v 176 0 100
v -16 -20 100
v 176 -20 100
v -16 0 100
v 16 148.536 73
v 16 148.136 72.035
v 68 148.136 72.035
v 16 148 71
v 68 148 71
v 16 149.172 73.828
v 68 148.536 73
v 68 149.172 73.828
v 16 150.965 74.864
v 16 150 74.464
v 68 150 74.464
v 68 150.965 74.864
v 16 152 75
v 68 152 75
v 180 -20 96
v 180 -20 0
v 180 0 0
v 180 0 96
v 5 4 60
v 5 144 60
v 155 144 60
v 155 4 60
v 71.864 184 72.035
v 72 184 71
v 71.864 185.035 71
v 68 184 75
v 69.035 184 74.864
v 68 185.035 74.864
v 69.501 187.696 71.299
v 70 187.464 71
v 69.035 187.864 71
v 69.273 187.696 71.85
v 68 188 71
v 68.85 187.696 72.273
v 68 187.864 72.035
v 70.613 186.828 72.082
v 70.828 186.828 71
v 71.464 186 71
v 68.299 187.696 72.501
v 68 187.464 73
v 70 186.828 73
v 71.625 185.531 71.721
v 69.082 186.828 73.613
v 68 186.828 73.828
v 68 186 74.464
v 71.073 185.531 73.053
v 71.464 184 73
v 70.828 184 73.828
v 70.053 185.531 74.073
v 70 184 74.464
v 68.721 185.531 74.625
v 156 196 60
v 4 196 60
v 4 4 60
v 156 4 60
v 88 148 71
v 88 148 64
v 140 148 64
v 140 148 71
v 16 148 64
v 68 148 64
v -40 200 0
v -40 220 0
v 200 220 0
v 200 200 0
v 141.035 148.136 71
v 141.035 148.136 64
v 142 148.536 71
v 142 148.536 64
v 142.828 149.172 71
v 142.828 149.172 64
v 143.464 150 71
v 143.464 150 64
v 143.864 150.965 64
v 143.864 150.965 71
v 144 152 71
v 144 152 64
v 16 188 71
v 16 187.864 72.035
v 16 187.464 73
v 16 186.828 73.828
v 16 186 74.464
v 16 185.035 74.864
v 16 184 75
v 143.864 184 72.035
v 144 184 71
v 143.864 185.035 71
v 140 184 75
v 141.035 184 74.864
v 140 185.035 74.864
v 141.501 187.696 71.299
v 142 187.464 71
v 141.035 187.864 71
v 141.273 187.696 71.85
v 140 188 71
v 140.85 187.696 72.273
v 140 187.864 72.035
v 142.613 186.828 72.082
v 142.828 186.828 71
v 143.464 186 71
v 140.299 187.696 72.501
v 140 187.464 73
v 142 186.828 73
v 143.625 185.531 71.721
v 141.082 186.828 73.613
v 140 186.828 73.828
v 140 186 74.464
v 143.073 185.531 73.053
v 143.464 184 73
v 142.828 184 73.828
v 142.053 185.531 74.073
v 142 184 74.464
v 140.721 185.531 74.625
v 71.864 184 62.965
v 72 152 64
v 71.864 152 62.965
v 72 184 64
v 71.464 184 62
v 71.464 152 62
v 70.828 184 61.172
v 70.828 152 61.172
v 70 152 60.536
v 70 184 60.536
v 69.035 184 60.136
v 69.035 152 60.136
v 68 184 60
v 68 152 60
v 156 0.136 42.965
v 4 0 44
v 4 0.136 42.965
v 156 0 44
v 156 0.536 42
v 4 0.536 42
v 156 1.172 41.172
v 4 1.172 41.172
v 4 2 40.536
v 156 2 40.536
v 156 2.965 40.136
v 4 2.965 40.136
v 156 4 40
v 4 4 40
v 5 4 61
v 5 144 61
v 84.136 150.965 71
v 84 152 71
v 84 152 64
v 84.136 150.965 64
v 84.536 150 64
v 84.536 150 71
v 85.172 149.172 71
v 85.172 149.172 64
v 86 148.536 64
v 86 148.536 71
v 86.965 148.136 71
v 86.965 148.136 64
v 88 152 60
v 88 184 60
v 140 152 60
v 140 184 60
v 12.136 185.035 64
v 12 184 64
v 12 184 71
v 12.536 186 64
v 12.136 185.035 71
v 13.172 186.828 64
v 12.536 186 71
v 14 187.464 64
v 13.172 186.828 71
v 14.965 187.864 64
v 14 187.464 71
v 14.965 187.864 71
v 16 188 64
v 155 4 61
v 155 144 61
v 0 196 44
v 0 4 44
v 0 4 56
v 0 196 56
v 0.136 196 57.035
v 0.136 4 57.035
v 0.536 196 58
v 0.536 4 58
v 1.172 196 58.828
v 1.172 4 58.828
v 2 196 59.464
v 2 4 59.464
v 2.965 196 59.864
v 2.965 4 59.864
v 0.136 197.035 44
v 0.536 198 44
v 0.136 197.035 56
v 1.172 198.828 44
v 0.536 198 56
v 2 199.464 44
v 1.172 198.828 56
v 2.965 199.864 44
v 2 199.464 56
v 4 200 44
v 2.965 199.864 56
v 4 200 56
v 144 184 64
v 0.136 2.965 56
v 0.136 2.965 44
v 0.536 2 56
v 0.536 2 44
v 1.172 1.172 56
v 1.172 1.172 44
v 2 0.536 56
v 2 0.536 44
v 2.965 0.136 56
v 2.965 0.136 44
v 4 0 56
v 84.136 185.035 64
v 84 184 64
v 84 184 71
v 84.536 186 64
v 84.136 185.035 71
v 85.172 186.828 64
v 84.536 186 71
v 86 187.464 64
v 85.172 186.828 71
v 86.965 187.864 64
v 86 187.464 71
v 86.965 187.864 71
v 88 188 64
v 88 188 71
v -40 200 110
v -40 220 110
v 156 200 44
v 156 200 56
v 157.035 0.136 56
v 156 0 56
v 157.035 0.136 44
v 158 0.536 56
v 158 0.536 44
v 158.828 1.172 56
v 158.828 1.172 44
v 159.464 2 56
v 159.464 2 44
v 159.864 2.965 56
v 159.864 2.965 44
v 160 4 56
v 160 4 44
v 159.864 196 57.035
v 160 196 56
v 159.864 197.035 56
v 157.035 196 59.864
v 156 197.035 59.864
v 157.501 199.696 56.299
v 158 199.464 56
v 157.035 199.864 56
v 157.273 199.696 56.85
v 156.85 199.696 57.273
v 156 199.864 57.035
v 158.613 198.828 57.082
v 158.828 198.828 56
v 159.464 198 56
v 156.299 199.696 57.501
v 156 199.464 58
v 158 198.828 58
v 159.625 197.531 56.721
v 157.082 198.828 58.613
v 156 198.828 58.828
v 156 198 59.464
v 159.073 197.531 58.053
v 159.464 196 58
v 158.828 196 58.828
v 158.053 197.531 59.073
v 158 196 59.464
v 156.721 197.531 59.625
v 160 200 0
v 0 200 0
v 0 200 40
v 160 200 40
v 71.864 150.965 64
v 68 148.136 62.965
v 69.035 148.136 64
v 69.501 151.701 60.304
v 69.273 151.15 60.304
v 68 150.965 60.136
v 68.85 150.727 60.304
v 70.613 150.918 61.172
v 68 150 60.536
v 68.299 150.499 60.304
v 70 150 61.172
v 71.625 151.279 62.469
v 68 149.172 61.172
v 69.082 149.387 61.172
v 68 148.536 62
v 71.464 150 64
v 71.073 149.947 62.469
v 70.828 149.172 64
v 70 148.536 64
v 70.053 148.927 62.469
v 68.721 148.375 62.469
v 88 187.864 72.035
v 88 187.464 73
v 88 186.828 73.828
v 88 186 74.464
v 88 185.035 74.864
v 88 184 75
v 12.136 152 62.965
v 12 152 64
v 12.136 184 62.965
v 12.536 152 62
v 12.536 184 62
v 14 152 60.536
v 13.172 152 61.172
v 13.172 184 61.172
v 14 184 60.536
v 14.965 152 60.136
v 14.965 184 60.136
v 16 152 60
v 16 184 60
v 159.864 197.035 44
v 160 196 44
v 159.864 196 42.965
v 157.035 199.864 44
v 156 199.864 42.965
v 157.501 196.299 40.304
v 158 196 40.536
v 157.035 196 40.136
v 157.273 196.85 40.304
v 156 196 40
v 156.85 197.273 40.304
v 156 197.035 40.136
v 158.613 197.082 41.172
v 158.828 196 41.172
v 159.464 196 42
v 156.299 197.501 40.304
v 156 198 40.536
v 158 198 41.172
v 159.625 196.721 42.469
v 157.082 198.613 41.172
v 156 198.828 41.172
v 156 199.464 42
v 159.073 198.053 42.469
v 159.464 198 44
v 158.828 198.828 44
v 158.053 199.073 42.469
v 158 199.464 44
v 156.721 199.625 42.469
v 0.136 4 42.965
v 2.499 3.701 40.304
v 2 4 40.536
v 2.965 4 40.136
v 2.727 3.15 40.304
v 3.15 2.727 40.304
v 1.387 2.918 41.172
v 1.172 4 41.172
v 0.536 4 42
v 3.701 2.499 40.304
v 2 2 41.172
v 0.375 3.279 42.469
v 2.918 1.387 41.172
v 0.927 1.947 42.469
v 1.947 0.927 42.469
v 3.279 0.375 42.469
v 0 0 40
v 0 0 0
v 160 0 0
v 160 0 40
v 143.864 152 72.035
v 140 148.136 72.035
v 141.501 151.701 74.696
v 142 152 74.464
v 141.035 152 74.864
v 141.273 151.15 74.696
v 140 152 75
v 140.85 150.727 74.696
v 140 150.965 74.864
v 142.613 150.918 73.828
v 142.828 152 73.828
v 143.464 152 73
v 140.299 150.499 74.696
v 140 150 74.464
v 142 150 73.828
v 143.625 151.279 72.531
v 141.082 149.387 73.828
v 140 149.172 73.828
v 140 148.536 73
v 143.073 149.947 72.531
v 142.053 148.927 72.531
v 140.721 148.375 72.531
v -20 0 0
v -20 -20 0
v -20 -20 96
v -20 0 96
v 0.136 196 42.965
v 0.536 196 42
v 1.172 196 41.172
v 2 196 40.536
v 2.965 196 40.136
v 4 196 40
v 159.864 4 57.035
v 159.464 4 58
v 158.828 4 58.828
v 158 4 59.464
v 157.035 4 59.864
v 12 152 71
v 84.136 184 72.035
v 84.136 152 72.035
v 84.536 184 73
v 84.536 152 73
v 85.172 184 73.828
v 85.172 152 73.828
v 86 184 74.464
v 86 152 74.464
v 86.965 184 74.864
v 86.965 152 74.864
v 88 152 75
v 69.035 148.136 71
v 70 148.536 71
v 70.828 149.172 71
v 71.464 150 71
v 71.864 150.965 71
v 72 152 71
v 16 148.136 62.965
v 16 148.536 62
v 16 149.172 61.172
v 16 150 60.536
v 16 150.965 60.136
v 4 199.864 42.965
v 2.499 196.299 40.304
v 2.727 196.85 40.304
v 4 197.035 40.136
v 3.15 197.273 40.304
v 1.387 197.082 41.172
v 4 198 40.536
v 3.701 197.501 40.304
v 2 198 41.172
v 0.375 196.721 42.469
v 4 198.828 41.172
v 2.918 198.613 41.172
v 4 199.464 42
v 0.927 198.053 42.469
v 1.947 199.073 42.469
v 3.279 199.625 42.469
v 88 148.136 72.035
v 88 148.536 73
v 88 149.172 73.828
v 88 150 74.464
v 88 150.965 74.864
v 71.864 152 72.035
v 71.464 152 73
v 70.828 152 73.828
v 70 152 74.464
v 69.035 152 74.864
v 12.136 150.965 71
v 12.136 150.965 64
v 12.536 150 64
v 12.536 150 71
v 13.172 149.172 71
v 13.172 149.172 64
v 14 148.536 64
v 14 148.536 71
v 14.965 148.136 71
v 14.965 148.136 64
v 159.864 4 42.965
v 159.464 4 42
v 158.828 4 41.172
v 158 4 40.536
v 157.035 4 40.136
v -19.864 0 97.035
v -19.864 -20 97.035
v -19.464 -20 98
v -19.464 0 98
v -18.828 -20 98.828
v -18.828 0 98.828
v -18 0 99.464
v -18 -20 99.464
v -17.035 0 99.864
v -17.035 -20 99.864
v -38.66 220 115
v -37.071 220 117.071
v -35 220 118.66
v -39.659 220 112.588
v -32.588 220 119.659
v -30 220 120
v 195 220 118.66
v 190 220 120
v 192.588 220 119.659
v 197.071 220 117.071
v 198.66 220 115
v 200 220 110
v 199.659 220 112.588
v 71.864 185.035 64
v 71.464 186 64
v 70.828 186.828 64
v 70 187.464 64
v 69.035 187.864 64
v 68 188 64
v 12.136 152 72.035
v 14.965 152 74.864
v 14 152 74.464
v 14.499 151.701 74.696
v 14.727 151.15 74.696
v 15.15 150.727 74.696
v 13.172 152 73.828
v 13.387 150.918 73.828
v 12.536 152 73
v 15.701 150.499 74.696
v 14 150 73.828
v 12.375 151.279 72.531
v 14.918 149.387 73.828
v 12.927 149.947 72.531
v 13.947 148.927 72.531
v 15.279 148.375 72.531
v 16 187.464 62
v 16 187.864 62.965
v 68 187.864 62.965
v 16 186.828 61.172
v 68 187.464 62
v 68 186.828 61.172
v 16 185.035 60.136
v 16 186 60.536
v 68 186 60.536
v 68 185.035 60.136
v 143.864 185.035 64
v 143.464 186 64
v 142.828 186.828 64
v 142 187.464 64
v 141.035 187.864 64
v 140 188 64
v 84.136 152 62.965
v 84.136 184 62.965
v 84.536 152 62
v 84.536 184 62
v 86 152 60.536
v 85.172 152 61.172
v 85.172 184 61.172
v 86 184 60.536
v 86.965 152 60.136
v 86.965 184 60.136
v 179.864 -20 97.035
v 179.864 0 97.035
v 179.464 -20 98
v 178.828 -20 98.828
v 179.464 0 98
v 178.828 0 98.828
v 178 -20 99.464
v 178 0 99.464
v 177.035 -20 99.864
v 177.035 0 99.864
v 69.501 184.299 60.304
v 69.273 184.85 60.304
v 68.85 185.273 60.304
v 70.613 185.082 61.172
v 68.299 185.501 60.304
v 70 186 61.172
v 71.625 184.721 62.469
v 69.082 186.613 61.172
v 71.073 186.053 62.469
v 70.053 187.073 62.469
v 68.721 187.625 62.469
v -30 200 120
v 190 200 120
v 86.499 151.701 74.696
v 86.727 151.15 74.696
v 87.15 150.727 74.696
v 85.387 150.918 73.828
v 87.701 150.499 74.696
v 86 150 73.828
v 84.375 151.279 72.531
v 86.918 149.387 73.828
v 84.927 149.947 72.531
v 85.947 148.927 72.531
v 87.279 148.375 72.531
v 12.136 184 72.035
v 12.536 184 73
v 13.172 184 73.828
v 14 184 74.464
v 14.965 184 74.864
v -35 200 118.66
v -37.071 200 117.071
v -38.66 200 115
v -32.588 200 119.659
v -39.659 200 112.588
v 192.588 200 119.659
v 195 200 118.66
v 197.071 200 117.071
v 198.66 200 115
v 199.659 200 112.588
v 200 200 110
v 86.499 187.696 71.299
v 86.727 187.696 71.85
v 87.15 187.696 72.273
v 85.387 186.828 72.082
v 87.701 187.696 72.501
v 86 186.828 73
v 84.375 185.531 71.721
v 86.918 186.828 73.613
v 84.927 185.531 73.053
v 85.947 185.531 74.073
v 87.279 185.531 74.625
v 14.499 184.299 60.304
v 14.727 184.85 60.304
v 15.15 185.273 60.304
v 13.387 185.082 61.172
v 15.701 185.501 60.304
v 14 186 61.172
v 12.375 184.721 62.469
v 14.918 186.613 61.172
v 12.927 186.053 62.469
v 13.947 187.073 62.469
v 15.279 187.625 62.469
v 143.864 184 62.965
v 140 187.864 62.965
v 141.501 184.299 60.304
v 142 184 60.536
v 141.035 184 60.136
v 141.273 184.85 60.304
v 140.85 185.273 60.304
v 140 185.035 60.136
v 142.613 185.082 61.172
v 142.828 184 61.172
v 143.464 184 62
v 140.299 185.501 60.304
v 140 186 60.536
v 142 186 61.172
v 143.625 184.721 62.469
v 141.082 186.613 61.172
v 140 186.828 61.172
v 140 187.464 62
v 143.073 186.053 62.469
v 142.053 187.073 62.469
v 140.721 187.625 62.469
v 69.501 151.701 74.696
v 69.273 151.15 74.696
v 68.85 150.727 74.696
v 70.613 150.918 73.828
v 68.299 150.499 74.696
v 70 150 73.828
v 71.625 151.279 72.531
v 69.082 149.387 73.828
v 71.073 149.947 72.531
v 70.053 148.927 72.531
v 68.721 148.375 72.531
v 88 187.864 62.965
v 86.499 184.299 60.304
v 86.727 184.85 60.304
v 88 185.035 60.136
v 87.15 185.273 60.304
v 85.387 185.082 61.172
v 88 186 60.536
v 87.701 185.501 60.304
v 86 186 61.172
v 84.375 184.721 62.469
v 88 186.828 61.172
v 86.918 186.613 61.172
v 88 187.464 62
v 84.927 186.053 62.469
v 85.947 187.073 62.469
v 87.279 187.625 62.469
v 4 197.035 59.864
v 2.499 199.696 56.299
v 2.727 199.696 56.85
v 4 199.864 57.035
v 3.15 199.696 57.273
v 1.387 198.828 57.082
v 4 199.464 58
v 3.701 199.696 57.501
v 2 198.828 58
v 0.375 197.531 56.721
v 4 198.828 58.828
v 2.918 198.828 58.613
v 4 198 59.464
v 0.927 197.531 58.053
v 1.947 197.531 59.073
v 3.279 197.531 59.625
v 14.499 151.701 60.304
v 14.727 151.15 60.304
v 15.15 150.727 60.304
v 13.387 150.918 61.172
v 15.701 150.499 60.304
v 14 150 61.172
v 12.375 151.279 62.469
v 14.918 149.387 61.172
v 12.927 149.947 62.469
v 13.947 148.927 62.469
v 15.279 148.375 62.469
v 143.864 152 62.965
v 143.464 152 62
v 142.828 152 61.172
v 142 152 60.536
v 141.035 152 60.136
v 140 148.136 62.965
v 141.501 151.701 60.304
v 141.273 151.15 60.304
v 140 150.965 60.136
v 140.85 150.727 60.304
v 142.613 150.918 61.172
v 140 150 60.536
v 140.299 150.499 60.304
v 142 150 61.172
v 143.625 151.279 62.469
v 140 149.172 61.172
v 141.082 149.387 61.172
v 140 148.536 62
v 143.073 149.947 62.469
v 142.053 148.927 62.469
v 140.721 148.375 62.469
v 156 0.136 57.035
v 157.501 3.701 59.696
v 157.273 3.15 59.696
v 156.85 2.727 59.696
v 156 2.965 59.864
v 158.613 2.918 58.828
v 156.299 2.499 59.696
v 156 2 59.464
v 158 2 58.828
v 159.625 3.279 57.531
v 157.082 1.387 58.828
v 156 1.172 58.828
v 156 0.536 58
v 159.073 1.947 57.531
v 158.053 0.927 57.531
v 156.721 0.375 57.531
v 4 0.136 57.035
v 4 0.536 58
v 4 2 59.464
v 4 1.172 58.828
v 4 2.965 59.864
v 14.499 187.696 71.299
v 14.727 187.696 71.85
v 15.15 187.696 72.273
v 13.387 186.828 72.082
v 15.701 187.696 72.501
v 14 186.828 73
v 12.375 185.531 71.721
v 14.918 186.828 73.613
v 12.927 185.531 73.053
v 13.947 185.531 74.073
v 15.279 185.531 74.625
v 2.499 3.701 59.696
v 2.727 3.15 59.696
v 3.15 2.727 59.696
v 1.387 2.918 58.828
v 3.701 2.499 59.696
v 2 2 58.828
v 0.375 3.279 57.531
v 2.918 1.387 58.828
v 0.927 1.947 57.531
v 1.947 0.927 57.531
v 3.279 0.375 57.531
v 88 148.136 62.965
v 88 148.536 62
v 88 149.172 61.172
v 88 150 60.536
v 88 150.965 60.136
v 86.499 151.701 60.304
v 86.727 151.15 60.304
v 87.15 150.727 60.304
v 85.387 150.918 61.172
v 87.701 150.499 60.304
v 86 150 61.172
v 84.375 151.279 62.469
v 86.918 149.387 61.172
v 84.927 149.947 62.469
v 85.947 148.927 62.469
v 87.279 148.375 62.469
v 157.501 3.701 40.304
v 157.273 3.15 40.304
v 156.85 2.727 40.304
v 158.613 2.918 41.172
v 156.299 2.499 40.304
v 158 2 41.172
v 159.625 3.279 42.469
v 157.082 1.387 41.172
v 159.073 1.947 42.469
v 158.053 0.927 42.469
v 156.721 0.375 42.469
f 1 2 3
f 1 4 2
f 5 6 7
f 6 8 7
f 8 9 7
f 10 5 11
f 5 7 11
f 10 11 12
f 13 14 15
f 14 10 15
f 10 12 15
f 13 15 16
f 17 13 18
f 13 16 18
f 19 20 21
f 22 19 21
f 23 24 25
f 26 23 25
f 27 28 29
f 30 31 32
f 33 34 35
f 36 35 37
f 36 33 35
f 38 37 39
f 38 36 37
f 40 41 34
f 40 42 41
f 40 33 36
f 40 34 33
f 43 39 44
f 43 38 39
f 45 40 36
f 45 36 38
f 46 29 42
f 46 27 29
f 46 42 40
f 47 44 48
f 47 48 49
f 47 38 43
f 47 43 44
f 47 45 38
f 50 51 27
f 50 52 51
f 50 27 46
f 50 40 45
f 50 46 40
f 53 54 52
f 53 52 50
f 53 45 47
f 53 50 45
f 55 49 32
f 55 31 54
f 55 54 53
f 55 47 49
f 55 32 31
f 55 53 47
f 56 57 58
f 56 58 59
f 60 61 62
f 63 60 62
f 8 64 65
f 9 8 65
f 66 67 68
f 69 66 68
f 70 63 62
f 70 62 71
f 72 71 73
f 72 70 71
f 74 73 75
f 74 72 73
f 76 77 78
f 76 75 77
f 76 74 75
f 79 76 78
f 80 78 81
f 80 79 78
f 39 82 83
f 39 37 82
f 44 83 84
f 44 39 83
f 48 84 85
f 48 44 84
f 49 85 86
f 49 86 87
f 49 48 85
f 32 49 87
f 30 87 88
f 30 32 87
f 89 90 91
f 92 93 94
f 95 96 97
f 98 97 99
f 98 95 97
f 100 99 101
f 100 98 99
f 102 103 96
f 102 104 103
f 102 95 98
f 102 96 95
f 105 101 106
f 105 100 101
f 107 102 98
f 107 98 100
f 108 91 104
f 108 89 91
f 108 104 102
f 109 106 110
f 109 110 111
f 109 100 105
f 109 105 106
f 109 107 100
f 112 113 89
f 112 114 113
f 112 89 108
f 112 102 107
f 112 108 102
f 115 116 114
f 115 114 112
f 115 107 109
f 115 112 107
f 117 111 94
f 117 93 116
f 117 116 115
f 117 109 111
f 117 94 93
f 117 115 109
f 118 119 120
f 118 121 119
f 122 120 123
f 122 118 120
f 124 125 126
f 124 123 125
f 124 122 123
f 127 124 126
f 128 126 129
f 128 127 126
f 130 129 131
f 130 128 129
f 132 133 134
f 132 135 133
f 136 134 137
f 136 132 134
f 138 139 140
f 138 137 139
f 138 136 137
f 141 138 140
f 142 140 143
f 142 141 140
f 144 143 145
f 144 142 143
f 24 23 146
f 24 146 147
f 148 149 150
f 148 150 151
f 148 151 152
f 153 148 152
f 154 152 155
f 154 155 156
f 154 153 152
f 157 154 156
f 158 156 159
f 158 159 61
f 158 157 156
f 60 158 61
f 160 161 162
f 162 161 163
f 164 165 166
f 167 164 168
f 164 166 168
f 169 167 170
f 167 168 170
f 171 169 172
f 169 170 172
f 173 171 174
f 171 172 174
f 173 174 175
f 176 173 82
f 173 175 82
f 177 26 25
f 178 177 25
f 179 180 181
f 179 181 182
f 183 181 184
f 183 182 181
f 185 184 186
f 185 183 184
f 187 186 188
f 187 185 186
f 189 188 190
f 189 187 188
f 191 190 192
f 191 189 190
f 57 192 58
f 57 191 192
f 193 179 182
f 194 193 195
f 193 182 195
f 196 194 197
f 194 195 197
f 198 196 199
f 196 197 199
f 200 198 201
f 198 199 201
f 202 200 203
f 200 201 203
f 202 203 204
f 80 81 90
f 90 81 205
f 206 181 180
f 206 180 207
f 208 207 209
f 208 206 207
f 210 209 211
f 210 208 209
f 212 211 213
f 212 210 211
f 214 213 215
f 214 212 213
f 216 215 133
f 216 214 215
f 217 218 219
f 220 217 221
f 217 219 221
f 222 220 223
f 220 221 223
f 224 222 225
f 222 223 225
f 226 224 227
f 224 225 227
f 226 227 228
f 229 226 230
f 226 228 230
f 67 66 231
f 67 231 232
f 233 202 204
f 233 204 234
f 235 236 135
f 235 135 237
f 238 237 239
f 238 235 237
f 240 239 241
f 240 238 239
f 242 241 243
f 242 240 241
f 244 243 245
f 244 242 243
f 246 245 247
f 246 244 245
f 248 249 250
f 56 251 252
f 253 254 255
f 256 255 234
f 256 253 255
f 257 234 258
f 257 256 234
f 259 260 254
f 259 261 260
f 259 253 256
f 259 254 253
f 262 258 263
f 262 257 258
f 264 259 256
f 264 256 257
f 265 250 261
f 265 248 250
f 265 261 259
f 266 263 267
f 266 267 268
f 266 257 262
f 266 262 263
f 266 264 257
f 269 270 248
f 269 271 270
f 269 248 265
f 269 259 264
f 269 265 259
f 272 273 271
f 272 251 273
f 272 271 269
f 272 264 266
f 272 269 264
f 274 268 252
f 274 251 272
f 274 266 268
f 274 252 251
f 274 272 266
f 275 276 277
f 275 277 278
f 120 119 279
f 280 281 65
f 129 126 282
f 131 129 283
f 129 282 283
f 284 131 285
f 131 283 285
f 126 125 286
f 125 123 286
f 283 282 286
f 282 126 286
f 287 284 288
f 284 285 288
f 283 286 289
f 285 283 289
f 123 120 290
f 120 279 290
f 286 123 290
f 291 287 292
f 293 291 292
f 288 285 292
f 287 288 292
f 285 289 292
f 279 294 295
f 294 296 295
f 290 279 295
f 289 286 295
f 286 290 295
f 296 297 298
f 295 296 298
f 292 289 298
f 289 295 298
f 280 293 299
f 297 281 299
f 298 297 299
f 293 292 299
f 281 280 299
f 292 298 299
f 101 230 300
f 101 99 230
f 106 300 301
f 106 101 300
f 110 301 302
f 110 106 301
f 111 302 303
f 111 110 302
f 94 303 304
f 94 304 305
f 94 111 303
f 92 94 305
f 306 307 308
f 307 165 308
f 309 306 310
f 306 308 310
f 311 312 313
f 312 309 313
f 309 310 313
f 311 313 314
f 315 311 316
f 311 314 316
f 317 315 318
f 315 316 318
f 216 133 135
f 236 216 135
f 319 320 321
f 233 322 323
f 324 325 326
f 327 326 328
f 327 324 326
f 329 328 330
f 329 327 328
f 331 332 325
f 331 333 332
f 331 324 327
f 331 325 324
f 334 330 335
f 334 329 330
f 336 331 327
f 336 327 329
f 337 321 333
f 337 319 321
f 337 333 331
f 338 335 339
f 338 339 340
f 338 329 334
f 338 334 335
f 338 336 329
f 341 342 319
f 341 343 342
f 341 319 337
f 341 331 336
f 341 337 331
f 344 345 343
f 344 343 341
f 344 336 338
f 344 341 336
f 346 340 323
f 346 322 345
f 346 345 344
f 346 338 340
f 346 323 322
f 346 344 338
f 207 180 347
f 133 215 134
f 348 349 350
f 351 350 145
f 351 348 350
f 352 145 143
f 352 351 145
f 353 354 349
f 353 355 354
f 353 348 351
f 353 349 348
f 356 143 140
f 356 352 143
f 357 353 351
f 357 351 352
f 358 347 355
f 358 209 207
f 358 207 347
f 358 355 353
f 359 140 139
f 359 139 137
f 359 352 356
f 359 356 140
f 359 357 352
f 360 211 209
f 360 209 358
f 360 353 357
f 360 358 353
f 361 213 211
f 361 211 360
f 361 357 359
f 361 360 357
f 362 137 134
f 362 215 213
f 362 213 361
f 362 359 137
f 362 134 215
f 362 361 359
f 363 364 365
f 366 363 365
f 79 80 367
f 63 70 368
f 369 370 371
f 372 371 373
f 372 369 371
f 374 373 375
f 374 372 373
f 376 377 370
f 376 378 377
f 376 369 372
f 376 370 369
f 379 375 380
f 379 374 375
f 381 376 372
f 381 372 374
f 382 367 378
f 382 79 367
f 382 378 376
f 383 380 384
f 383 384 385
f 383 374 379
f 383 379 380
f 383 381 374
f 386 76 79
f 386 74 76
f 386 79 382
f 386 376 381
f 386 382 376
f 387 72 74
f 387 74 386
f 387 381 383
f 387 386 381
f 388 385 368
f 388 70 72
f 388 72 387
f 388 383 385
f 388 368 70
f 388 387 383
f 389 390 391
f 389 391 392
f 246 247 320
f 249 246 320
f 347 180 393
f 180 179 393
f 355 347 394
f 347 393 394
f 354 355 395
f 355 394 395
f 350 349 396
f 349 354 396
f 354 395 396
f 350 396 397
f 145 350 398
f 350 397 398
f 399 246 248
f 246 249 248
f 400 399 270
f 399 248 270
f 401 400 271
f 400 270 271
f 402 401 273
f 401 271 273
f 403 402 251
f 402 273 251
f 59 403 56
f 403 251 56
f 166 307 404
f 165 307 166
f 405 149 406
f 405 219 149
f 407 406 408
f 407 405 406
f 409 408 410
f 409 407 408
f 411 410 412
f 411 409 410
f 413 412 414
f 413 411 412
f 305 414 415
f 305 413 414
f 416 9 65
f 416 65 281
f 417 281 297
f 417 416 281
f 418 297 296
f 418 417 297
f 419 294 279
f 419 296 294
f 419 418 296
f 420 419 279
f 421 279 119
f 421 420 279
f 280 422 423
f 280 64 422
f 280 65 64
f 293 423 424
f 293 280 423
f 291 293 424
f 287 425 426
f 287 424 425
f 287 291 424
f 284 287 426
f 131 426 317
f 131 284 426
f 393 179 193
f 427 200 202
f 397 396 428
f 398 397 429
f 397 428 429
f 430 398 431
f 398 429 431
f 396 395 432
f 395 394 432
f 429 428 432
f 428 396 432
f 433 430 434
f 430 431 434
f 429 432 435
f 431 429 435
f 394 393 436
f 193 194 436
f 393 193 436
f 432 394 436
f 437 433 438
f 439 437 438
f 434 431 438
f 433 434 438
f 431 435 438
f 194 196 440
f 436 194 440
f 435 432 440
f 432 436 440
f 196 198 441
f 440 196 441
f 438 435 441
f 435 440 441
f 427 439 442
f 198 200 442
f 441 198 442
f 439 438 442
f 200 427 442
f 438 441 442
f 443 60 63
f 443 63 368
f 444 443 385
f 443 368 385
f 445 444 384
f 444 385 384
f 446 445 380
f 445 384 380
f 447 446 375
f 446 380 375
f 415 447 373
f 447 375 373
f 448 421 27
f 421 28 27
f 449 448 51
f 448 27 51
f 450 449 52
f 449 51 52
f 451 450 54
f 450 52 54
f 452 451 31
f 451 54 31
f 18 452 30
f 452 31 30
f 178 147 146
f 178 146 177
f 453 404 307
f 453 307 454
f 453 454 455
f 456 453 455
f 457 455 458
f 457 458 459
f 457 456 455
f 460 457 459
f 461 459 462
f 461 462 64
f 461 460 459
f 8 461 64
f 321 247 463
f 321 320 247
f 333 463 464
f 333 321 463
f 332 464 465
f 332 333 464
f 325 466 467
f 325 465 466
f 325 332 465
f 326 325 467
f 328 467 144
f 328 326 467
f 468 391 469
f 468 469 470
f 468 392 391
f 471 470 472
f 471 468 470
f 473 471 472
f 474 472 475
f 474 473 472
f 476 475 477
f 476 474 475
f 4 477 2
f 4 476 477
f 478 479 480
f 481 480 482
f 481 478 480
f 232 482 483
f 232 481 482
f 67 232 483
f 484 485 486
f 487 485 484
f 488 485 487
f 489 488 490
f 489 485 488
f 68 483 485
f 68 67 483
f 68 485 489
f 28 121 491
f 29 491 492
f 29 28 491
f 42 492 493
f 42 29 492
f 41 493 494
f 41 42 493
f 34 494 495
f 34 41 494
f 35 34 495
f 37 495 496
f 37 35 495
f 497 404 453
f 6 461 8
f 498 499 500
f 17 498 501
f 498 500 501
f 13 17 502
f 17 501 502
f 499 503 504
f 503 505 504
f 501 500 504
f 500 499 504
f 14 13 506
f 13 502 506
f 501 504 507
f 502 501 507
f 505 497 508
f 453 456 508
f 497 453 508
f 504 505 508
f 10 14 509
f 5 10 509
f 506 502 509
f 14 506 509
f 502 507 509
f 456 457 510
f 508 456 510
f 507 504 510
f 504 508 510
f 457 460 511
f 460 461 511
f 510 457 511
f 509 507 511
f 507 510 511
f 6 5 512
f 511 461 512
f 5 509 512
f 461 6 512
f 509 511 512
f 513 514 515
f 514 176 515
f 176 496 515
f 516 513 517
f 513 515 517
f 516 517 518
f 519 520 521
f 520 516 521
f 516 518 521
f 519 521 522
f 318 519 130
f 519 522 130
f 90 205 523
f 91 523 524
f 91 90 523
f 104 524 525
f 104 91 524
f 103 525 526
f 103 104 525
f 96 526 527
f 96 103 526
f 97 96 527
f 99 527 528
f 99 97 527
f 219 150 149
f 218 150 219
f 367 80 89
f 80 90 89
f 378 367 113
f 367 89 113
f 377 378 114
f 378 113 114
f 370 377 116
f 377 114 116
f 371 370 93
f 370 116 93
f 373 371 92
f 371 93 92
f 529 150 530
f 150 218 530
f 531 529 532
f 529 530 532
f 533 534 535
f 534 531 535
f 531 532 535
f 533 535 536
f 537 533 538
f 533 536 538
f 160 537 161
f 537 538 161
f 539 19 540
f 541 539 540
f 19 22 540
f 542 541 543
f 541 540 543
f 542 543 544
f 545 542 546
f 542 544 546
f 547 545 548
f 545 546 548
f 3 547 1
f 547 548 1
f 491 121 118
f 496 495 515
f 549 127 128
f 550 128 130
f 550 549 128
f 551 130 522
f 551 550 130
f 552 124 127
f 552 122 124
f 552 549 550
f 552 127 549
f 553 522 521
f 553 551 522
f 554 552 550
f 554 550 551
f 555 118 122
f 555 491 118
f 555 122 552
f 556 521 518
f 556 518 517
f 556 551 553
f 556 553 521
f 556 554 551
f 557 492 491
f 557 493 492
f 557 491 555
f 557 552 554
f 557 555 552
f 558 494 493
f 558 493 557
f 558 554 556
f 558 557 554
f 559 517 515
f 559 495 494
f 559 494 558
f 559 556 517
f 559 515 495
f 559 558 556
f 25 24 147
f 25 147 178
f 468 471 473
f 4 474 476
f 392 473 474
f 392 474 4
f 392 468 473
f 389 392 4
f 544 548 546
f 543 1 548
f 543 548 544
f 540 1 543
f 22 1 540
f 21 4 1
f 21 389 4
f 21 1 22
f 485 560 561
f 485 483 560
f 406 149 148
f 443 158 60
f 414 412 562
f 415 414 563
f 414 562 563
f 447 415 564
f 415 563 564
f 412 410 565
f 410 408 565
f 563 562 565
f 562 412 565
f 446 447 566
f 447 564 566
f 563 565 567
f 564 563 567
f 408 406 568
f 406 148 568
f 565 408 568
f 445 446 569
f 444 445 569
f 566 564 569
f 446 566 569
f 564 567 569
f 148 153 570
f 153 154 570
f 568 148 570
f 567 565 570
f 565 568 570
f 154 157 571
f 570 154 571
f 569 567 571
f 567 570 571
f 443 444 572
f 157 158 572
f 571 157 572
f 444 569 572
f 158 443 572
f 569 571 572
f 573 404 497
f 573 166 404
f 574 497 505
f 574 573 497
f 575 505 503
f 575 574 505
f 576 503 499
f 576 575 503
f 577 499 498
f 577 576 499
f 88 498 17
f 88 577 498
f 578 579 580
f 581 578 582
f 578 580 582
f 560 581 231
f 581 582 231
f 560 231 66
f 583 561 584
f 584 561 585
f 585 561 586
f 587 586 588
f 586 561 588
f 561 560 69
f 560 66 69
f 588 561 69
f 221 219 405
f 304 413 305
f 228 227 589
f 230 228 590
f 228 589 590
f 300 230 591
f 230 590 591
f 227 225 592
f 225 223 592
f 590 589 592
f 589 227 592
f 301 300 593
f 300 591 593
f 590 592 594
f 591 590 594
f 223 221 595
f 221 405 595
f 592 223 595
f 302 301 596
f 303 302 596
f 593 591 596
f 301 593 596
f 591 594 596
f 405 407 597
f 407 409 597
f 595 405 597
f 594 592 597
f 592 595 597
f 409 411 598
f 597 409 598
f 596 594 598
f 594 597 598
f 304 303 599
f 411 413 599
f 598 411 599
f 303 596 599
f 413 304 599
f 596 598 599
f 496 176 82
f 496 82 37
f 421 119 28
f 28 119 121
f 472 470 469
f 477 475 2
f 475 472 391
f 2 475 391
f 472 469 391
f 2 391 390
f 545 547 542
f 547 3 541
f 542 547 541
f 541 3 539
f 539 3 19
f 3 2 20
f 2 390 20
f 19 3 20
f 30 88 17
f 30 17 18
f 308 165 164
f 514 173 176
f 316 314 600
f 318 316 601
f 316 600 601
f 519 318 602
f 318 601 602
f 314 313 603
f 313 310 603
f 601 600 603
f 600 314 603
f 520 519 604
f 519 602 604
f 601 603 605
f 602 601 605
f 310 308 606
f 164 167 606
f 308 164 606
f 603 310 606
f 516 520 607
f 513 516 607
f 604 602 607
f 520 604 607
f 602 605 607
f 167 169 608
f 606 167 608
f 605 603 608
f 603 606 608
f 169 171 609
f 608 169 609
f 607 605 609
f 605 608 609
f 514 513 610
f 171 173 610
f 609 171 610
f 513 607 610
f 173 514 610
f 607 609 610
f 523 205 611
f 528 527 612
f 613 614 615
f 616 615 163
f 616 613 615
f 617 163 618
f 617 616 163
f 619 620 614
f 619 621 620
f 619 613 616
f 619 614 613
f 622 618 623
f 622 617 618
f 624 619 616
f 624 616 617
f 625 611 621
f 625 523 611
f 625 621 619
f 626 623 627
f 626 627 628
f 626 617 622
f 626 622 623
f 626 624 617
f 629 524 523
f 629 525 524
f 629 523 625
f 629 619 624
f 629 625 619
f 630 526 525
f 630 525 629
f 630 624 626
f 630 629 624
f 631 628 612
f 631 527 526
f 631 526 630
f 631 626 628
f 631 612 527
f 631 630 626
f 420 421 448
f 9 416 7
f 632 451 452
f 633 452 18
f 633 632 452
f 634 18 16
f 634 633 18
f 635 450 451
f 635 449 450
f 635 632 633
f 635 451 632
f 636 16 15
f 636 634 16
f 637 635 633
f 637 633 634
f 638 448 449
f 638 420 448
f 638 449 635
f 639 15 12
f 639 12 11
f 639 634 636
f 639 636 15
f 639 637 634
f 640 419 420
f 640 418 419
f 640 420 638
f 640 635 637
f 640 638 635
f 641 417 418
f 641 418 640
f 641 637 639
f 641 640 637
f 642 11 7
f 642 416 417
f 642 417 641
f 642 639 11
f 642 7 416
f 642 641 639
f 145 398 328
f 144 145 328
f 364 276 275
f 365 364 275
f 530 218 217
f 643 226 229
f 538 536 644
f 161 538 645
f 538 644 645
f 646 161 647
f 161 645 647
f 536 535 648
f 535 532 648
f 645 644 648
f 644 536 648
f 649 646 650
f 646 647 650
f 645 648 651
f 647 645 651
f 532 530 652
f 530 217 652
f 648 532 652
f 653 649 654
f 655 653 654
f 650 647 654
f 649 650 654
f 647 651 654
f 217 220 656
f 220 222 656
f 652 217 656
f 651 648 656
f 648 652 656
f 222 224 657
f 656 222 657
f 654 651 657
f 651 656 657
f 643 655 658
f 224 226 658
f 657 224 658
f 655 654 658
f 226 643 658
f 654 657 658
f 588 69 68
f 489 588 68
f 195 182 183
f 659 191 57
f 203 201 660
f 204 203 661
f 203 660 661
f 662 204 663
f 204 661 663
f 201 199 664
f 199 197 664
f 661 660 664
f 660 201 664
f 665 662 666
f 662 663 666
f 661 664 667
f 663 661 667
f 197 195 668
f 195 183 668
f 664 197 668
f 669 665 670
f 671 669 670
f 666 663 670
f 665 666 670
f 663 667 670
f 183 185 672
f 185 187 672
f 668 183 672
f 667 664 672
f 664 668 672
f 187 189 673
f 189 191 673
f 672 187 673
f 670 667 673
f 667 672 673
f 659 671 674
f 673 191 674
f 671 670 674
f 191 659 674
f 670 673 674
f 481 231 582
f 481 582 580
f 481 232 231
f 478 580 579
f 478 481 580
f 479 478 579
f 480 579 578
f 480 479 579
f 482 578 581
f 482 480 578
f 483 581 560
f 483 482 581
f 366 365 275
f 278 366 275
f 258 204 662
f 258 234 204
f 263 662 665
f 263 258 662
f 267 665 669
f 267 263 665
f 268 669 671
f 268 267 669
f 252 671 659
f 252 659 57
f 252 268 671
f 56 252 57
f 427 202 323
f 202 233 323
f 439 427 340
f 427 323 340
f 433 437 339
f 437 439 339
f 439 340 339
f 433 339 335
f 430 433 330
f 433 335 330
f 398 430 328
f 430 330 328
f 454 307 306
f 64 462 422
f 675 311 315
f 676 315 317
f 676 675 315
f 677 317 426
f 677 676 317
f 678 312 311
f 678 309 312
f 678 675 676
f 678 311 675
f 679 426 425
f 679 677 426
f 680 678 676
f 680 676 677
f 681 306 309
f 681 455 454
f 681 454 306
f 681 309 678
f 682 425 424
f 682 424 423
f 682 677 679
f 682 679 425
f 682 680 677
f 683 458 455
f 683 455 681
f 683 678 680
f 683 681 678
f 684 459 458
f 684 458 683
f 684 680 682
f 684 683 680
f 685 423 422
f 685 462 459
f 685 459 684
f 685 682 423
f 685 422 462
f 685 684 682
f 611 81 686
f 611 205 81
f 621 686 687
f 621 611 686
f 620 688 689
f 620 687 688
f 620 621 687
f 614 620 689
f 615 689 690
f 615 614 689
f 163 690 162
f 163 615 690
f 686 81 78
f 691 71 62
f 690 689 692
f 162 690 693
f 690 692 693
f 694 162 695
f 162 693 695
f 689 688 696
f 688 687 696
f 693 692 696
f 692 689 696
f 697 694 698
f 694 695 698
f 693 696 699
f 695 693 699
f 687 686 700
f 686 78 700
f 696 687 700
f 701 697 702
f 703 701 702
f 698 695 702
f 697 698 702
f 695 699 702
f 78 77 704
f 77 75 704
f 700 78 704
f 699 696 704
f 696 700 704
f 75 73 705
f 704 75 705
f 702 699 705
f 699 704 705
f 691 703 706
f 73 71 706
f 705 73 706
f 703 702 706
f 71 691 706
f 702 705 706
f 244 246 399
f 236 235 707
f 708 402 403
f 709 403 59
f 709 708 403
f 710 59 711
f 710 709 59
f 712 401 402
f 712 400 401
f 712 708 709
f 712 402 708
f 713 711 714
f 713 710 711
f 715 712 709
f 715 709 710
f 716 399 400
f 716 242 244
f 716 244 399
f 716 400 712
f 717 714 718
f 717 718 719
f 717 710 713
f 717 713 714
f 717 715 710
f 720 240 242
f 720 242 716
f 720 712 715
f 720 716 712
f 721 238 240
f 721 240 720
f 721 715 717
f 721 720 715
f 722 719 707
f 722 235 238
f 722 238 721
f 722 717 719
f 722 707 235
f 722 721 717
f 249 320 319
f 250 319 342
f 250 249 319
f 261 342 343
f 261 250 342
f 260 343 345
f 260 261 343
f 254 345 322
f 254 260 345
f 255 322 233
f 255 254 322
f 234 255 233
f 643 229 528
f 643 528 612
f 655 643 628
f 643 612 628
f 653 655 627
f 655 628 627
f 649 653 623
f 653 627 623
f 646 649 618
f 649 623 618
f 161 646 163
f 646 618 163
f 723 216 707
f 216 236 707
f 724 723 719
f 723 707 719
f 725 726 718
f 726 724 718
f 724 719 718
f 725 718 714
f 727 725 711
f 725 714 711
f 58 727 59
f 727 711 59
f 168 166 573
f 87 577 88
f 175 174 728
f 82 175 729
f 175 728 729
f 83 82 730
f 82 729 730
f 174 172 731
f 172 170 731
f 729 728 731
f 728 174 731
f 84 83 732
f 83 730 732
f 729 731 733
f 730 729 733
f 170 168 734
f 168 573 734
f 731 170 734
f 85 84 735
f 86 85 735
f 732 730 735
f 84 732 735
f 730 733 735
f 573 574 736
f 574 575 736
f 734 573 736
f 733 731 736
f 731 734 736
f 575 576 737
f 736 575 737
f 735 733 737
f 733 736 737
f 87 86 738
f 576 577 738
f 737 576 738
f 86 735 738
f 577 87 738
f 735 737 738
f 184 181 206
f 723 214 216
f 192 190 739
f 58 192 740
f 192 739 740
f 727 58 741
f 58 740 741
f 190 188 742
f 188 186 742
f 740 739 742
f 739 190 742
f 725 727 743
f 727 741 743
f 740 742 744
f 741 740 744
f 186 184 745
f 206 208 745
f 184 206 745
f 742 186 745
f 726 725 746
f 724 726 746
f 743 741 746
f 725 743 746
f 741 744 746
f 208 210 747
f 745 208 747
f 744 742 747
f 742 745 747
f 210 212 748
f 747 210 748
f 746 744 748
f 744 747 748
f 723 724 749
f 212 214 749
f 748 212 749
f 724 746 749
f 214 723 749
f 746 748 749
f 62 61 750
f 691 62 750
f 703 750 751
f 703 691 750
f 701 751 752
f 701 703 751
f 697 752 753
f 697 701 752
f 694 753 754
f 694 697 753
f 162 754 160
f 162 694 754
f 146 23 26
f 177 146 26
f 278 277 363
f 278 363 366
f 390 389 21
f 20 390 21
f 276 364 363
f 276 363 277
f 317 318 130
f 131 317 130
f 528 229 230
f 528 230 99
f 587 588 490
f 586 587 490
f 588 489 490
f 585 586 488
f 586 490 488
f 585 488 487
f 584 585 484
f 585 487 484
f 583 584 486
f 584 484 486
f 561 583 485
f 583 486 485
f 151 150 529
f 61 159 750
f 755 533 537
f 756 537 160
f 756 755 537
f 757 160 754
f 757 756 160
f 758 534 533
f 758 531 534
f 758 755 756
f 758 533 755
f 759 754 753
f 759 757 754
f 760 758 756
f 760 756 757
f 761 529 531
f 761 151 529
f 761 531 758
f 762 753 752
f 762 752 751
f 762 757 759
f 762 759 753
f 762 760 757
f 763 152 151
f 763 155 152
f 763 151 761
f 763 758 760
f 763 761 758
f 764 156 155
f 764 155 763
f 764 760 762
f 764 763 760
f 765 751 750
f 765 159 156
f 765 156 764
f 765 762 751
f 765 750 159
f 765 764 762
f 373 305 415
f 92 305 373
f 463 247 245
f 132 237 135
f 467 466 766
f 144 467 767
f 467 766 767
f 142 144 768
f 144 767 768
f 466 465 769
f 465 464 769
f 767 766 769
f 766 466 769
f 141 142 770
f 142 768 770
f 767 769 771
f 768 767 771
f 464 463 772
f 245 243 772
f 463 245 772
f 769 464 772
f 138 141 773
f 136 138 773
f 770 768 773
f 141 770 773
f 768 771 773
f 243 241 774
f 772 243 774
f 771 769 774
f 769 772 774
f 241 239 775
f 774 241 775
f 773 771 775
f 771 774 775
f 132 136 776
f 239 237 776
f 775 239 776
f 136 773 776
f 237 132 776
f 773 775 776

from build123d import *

# Parameters (mm, degrees)
BOX_W        = 160
BOX_H        = 200
BOX_DEPTH    = 40
BOX001_W     = 160
BOX001_H     = 200
BOX001_DEPTH = 20
FILLET_R     = 4
BOX002_W     = 240
BOX002_H     = 20
BOX002_DEPTH = 120
FILLET001_R  = 10
BOX003_W     = 60
BOX003_H     = 40
BOX003_DEPTH = 15
FILLET002_R  = 4
BOX004_W     = 60
BOX004_H     = 40
BOX004_DEPTH = 15
FILLET003_R  = 4
BOX005_W     = 200
BOX005_H     = 20
BOX005_DEPTH = 100
FILLET004_R  = 4
BOX006_W     = 150
BOX006_H     = 140
BOX006_DEPTH = 1


with BuildPart() as sommier:
    # Box → Box (new body)
    with BuildSketch(Plane.XY):
        with Locations((80, 100)):
            Rectangle(BOX_W, BOX_H)
    extrude(amount=BOX_DEPTH)


with BuildPart() as matelas:
    # Box001 → Box001 (new body)
    with BuildSketch(Plane.XY.offset(40)):
        with Locations((80, 100)):
            Rectangle(BOX001_W, BOX001_H)
    extrude(amount=BOX001_DEPTH)

    # Fillet
    fillet_edges = [matelas.edges().sort_by_distance(p)[0] for p in [
        (0, 0, 50),
        (0, 100, 60),
        (0, 200, 50),
        (0, 100, 40),
        (160, 0, 50),
        (160, 100, 60),
        (160, 200, 50),
        (160, 100, 40),
        (80, 0, 40),
        (80, 0, 60),
        (80, 200, 40),
        (80, 200, 60),
    ]]
    fillet(fillet_edges, radius=FILLET_R)


with BuildPart() as tete_de_lit:
    # Box002 → Box002 (new body)
    with BuildSketch(Plane(origin=(-40, 200, 0), x_dir=(1, 0, 0), z_dir=(0, 0, 1))):
        with Locations((120, 10)):
            Rectangle(BOX002_W, BOX002_H)
    extrude(amount=BOX002_DEPTH)

    # Fillet001
    fillet001_edges = [tete_de_lit.edges().sort_by_distance(p)[0] for p in [
        (-40, 210, 120),
        (200, 210, 120),
    ]]
    fillet(fillet001_edges, radius=FILLET001_R)


with BuildPart() as fillet002:
    # Box003 → Box003 (new body)
    with BuildSketch(Plane(origin=(12, 148, 60), x_dir=(1, 0, 0), z_dir=(0, 0, 1))):
        with Locations((30, 20)):
            Rectangle(BOX003_W, BOX003_H)
    extrude(amount=BOX003_DEPTH)

    # Fillet002
    fillet002_edges = [fillet002.edges().sort_by_distance(p)[0] for p in [
        (12, 148, 67.5),
        (12, 168, 75),
        (12, 188, 67.5),
        (12, 168, 60),
        (72, 148, 67.5),
        (72, 168, 75),
        (72, 188, 67.5),
        (72, 168, 60),
        (42, 148, 60),
        (42, 148, 75),
        (42, 188, 60),
        (42, 188, 75),
    ]]
    fillet(fillet002_edges, radius=FILLET002_R)


with BuildPart() as fillet003:
    # Box004 → Box004 (new body)
    with BuildSketch(Plane(origin=(84, 148, 60), x_dir=(1, 0, 0), z_dir=(0, 0, 1))):
        with Locations((30, 20)):
            Rectangle(BOX004_W, BOX004_H)
    extrude(amount=BOX004_DEPTH)

    # Fillet003
    fillet003_edges = [fillet003.edges().sort_by_distance(p)[0] for p in [
        (84, 148, 67.5),
        (84, 168, 75),
        (84, 188, 67.5),
        (84, 168, 60),
        (144, 148, 67.5),
        (144, 168, 75),
        (144, 188, 67.5),
        (144, 168, 60),
        (114, 148, 60),
        (114, 148, 75),
        (114, 188, 60),
        (114, 188, 75),
    ]]
    fillet(fillet003_edges, radius=FILLET003_R)


with BuildPart() as pied_de_lit:
    # Box005 → Box005 (new body)
    with BuildSketch(Plane(origin=(-20, -20, 0), x_dir=(1, 0, 0), z_dir=(0, 0, 1))):
        with Locations((100, 10)):
            Rectangle(BOX005_W, BOX005_H)
    extrude(amount=BOX005_DEPTH)

    # Fillet004
    fillet004_edges = [pied_de_lit.edges().sort_by_distance(p)[0] for p in [
        (-20, -10, 100),
        (180, -10, 100),
    ]]
    fillet(fillet004_edges, radius=FILLET004_R)


with BuildPart() as couverture:
    # Box006 → Box006 (new body)
    with BuildSketch(Plane(origin=(5, 4, 60), x_dir=(1, 0, 0), z_dir=(0, 0, 1))):
        with Locations((75, 70)):
            Rectangle(BOX006_W, BOX006_H)
    extrude(amount=BOX006_DEPTH)


solid = Compound([sommier.part, matelas.part, tete_de_lit.part, fillet002.part, fillet003.part, pied_de_lit.part, couverture.part])
